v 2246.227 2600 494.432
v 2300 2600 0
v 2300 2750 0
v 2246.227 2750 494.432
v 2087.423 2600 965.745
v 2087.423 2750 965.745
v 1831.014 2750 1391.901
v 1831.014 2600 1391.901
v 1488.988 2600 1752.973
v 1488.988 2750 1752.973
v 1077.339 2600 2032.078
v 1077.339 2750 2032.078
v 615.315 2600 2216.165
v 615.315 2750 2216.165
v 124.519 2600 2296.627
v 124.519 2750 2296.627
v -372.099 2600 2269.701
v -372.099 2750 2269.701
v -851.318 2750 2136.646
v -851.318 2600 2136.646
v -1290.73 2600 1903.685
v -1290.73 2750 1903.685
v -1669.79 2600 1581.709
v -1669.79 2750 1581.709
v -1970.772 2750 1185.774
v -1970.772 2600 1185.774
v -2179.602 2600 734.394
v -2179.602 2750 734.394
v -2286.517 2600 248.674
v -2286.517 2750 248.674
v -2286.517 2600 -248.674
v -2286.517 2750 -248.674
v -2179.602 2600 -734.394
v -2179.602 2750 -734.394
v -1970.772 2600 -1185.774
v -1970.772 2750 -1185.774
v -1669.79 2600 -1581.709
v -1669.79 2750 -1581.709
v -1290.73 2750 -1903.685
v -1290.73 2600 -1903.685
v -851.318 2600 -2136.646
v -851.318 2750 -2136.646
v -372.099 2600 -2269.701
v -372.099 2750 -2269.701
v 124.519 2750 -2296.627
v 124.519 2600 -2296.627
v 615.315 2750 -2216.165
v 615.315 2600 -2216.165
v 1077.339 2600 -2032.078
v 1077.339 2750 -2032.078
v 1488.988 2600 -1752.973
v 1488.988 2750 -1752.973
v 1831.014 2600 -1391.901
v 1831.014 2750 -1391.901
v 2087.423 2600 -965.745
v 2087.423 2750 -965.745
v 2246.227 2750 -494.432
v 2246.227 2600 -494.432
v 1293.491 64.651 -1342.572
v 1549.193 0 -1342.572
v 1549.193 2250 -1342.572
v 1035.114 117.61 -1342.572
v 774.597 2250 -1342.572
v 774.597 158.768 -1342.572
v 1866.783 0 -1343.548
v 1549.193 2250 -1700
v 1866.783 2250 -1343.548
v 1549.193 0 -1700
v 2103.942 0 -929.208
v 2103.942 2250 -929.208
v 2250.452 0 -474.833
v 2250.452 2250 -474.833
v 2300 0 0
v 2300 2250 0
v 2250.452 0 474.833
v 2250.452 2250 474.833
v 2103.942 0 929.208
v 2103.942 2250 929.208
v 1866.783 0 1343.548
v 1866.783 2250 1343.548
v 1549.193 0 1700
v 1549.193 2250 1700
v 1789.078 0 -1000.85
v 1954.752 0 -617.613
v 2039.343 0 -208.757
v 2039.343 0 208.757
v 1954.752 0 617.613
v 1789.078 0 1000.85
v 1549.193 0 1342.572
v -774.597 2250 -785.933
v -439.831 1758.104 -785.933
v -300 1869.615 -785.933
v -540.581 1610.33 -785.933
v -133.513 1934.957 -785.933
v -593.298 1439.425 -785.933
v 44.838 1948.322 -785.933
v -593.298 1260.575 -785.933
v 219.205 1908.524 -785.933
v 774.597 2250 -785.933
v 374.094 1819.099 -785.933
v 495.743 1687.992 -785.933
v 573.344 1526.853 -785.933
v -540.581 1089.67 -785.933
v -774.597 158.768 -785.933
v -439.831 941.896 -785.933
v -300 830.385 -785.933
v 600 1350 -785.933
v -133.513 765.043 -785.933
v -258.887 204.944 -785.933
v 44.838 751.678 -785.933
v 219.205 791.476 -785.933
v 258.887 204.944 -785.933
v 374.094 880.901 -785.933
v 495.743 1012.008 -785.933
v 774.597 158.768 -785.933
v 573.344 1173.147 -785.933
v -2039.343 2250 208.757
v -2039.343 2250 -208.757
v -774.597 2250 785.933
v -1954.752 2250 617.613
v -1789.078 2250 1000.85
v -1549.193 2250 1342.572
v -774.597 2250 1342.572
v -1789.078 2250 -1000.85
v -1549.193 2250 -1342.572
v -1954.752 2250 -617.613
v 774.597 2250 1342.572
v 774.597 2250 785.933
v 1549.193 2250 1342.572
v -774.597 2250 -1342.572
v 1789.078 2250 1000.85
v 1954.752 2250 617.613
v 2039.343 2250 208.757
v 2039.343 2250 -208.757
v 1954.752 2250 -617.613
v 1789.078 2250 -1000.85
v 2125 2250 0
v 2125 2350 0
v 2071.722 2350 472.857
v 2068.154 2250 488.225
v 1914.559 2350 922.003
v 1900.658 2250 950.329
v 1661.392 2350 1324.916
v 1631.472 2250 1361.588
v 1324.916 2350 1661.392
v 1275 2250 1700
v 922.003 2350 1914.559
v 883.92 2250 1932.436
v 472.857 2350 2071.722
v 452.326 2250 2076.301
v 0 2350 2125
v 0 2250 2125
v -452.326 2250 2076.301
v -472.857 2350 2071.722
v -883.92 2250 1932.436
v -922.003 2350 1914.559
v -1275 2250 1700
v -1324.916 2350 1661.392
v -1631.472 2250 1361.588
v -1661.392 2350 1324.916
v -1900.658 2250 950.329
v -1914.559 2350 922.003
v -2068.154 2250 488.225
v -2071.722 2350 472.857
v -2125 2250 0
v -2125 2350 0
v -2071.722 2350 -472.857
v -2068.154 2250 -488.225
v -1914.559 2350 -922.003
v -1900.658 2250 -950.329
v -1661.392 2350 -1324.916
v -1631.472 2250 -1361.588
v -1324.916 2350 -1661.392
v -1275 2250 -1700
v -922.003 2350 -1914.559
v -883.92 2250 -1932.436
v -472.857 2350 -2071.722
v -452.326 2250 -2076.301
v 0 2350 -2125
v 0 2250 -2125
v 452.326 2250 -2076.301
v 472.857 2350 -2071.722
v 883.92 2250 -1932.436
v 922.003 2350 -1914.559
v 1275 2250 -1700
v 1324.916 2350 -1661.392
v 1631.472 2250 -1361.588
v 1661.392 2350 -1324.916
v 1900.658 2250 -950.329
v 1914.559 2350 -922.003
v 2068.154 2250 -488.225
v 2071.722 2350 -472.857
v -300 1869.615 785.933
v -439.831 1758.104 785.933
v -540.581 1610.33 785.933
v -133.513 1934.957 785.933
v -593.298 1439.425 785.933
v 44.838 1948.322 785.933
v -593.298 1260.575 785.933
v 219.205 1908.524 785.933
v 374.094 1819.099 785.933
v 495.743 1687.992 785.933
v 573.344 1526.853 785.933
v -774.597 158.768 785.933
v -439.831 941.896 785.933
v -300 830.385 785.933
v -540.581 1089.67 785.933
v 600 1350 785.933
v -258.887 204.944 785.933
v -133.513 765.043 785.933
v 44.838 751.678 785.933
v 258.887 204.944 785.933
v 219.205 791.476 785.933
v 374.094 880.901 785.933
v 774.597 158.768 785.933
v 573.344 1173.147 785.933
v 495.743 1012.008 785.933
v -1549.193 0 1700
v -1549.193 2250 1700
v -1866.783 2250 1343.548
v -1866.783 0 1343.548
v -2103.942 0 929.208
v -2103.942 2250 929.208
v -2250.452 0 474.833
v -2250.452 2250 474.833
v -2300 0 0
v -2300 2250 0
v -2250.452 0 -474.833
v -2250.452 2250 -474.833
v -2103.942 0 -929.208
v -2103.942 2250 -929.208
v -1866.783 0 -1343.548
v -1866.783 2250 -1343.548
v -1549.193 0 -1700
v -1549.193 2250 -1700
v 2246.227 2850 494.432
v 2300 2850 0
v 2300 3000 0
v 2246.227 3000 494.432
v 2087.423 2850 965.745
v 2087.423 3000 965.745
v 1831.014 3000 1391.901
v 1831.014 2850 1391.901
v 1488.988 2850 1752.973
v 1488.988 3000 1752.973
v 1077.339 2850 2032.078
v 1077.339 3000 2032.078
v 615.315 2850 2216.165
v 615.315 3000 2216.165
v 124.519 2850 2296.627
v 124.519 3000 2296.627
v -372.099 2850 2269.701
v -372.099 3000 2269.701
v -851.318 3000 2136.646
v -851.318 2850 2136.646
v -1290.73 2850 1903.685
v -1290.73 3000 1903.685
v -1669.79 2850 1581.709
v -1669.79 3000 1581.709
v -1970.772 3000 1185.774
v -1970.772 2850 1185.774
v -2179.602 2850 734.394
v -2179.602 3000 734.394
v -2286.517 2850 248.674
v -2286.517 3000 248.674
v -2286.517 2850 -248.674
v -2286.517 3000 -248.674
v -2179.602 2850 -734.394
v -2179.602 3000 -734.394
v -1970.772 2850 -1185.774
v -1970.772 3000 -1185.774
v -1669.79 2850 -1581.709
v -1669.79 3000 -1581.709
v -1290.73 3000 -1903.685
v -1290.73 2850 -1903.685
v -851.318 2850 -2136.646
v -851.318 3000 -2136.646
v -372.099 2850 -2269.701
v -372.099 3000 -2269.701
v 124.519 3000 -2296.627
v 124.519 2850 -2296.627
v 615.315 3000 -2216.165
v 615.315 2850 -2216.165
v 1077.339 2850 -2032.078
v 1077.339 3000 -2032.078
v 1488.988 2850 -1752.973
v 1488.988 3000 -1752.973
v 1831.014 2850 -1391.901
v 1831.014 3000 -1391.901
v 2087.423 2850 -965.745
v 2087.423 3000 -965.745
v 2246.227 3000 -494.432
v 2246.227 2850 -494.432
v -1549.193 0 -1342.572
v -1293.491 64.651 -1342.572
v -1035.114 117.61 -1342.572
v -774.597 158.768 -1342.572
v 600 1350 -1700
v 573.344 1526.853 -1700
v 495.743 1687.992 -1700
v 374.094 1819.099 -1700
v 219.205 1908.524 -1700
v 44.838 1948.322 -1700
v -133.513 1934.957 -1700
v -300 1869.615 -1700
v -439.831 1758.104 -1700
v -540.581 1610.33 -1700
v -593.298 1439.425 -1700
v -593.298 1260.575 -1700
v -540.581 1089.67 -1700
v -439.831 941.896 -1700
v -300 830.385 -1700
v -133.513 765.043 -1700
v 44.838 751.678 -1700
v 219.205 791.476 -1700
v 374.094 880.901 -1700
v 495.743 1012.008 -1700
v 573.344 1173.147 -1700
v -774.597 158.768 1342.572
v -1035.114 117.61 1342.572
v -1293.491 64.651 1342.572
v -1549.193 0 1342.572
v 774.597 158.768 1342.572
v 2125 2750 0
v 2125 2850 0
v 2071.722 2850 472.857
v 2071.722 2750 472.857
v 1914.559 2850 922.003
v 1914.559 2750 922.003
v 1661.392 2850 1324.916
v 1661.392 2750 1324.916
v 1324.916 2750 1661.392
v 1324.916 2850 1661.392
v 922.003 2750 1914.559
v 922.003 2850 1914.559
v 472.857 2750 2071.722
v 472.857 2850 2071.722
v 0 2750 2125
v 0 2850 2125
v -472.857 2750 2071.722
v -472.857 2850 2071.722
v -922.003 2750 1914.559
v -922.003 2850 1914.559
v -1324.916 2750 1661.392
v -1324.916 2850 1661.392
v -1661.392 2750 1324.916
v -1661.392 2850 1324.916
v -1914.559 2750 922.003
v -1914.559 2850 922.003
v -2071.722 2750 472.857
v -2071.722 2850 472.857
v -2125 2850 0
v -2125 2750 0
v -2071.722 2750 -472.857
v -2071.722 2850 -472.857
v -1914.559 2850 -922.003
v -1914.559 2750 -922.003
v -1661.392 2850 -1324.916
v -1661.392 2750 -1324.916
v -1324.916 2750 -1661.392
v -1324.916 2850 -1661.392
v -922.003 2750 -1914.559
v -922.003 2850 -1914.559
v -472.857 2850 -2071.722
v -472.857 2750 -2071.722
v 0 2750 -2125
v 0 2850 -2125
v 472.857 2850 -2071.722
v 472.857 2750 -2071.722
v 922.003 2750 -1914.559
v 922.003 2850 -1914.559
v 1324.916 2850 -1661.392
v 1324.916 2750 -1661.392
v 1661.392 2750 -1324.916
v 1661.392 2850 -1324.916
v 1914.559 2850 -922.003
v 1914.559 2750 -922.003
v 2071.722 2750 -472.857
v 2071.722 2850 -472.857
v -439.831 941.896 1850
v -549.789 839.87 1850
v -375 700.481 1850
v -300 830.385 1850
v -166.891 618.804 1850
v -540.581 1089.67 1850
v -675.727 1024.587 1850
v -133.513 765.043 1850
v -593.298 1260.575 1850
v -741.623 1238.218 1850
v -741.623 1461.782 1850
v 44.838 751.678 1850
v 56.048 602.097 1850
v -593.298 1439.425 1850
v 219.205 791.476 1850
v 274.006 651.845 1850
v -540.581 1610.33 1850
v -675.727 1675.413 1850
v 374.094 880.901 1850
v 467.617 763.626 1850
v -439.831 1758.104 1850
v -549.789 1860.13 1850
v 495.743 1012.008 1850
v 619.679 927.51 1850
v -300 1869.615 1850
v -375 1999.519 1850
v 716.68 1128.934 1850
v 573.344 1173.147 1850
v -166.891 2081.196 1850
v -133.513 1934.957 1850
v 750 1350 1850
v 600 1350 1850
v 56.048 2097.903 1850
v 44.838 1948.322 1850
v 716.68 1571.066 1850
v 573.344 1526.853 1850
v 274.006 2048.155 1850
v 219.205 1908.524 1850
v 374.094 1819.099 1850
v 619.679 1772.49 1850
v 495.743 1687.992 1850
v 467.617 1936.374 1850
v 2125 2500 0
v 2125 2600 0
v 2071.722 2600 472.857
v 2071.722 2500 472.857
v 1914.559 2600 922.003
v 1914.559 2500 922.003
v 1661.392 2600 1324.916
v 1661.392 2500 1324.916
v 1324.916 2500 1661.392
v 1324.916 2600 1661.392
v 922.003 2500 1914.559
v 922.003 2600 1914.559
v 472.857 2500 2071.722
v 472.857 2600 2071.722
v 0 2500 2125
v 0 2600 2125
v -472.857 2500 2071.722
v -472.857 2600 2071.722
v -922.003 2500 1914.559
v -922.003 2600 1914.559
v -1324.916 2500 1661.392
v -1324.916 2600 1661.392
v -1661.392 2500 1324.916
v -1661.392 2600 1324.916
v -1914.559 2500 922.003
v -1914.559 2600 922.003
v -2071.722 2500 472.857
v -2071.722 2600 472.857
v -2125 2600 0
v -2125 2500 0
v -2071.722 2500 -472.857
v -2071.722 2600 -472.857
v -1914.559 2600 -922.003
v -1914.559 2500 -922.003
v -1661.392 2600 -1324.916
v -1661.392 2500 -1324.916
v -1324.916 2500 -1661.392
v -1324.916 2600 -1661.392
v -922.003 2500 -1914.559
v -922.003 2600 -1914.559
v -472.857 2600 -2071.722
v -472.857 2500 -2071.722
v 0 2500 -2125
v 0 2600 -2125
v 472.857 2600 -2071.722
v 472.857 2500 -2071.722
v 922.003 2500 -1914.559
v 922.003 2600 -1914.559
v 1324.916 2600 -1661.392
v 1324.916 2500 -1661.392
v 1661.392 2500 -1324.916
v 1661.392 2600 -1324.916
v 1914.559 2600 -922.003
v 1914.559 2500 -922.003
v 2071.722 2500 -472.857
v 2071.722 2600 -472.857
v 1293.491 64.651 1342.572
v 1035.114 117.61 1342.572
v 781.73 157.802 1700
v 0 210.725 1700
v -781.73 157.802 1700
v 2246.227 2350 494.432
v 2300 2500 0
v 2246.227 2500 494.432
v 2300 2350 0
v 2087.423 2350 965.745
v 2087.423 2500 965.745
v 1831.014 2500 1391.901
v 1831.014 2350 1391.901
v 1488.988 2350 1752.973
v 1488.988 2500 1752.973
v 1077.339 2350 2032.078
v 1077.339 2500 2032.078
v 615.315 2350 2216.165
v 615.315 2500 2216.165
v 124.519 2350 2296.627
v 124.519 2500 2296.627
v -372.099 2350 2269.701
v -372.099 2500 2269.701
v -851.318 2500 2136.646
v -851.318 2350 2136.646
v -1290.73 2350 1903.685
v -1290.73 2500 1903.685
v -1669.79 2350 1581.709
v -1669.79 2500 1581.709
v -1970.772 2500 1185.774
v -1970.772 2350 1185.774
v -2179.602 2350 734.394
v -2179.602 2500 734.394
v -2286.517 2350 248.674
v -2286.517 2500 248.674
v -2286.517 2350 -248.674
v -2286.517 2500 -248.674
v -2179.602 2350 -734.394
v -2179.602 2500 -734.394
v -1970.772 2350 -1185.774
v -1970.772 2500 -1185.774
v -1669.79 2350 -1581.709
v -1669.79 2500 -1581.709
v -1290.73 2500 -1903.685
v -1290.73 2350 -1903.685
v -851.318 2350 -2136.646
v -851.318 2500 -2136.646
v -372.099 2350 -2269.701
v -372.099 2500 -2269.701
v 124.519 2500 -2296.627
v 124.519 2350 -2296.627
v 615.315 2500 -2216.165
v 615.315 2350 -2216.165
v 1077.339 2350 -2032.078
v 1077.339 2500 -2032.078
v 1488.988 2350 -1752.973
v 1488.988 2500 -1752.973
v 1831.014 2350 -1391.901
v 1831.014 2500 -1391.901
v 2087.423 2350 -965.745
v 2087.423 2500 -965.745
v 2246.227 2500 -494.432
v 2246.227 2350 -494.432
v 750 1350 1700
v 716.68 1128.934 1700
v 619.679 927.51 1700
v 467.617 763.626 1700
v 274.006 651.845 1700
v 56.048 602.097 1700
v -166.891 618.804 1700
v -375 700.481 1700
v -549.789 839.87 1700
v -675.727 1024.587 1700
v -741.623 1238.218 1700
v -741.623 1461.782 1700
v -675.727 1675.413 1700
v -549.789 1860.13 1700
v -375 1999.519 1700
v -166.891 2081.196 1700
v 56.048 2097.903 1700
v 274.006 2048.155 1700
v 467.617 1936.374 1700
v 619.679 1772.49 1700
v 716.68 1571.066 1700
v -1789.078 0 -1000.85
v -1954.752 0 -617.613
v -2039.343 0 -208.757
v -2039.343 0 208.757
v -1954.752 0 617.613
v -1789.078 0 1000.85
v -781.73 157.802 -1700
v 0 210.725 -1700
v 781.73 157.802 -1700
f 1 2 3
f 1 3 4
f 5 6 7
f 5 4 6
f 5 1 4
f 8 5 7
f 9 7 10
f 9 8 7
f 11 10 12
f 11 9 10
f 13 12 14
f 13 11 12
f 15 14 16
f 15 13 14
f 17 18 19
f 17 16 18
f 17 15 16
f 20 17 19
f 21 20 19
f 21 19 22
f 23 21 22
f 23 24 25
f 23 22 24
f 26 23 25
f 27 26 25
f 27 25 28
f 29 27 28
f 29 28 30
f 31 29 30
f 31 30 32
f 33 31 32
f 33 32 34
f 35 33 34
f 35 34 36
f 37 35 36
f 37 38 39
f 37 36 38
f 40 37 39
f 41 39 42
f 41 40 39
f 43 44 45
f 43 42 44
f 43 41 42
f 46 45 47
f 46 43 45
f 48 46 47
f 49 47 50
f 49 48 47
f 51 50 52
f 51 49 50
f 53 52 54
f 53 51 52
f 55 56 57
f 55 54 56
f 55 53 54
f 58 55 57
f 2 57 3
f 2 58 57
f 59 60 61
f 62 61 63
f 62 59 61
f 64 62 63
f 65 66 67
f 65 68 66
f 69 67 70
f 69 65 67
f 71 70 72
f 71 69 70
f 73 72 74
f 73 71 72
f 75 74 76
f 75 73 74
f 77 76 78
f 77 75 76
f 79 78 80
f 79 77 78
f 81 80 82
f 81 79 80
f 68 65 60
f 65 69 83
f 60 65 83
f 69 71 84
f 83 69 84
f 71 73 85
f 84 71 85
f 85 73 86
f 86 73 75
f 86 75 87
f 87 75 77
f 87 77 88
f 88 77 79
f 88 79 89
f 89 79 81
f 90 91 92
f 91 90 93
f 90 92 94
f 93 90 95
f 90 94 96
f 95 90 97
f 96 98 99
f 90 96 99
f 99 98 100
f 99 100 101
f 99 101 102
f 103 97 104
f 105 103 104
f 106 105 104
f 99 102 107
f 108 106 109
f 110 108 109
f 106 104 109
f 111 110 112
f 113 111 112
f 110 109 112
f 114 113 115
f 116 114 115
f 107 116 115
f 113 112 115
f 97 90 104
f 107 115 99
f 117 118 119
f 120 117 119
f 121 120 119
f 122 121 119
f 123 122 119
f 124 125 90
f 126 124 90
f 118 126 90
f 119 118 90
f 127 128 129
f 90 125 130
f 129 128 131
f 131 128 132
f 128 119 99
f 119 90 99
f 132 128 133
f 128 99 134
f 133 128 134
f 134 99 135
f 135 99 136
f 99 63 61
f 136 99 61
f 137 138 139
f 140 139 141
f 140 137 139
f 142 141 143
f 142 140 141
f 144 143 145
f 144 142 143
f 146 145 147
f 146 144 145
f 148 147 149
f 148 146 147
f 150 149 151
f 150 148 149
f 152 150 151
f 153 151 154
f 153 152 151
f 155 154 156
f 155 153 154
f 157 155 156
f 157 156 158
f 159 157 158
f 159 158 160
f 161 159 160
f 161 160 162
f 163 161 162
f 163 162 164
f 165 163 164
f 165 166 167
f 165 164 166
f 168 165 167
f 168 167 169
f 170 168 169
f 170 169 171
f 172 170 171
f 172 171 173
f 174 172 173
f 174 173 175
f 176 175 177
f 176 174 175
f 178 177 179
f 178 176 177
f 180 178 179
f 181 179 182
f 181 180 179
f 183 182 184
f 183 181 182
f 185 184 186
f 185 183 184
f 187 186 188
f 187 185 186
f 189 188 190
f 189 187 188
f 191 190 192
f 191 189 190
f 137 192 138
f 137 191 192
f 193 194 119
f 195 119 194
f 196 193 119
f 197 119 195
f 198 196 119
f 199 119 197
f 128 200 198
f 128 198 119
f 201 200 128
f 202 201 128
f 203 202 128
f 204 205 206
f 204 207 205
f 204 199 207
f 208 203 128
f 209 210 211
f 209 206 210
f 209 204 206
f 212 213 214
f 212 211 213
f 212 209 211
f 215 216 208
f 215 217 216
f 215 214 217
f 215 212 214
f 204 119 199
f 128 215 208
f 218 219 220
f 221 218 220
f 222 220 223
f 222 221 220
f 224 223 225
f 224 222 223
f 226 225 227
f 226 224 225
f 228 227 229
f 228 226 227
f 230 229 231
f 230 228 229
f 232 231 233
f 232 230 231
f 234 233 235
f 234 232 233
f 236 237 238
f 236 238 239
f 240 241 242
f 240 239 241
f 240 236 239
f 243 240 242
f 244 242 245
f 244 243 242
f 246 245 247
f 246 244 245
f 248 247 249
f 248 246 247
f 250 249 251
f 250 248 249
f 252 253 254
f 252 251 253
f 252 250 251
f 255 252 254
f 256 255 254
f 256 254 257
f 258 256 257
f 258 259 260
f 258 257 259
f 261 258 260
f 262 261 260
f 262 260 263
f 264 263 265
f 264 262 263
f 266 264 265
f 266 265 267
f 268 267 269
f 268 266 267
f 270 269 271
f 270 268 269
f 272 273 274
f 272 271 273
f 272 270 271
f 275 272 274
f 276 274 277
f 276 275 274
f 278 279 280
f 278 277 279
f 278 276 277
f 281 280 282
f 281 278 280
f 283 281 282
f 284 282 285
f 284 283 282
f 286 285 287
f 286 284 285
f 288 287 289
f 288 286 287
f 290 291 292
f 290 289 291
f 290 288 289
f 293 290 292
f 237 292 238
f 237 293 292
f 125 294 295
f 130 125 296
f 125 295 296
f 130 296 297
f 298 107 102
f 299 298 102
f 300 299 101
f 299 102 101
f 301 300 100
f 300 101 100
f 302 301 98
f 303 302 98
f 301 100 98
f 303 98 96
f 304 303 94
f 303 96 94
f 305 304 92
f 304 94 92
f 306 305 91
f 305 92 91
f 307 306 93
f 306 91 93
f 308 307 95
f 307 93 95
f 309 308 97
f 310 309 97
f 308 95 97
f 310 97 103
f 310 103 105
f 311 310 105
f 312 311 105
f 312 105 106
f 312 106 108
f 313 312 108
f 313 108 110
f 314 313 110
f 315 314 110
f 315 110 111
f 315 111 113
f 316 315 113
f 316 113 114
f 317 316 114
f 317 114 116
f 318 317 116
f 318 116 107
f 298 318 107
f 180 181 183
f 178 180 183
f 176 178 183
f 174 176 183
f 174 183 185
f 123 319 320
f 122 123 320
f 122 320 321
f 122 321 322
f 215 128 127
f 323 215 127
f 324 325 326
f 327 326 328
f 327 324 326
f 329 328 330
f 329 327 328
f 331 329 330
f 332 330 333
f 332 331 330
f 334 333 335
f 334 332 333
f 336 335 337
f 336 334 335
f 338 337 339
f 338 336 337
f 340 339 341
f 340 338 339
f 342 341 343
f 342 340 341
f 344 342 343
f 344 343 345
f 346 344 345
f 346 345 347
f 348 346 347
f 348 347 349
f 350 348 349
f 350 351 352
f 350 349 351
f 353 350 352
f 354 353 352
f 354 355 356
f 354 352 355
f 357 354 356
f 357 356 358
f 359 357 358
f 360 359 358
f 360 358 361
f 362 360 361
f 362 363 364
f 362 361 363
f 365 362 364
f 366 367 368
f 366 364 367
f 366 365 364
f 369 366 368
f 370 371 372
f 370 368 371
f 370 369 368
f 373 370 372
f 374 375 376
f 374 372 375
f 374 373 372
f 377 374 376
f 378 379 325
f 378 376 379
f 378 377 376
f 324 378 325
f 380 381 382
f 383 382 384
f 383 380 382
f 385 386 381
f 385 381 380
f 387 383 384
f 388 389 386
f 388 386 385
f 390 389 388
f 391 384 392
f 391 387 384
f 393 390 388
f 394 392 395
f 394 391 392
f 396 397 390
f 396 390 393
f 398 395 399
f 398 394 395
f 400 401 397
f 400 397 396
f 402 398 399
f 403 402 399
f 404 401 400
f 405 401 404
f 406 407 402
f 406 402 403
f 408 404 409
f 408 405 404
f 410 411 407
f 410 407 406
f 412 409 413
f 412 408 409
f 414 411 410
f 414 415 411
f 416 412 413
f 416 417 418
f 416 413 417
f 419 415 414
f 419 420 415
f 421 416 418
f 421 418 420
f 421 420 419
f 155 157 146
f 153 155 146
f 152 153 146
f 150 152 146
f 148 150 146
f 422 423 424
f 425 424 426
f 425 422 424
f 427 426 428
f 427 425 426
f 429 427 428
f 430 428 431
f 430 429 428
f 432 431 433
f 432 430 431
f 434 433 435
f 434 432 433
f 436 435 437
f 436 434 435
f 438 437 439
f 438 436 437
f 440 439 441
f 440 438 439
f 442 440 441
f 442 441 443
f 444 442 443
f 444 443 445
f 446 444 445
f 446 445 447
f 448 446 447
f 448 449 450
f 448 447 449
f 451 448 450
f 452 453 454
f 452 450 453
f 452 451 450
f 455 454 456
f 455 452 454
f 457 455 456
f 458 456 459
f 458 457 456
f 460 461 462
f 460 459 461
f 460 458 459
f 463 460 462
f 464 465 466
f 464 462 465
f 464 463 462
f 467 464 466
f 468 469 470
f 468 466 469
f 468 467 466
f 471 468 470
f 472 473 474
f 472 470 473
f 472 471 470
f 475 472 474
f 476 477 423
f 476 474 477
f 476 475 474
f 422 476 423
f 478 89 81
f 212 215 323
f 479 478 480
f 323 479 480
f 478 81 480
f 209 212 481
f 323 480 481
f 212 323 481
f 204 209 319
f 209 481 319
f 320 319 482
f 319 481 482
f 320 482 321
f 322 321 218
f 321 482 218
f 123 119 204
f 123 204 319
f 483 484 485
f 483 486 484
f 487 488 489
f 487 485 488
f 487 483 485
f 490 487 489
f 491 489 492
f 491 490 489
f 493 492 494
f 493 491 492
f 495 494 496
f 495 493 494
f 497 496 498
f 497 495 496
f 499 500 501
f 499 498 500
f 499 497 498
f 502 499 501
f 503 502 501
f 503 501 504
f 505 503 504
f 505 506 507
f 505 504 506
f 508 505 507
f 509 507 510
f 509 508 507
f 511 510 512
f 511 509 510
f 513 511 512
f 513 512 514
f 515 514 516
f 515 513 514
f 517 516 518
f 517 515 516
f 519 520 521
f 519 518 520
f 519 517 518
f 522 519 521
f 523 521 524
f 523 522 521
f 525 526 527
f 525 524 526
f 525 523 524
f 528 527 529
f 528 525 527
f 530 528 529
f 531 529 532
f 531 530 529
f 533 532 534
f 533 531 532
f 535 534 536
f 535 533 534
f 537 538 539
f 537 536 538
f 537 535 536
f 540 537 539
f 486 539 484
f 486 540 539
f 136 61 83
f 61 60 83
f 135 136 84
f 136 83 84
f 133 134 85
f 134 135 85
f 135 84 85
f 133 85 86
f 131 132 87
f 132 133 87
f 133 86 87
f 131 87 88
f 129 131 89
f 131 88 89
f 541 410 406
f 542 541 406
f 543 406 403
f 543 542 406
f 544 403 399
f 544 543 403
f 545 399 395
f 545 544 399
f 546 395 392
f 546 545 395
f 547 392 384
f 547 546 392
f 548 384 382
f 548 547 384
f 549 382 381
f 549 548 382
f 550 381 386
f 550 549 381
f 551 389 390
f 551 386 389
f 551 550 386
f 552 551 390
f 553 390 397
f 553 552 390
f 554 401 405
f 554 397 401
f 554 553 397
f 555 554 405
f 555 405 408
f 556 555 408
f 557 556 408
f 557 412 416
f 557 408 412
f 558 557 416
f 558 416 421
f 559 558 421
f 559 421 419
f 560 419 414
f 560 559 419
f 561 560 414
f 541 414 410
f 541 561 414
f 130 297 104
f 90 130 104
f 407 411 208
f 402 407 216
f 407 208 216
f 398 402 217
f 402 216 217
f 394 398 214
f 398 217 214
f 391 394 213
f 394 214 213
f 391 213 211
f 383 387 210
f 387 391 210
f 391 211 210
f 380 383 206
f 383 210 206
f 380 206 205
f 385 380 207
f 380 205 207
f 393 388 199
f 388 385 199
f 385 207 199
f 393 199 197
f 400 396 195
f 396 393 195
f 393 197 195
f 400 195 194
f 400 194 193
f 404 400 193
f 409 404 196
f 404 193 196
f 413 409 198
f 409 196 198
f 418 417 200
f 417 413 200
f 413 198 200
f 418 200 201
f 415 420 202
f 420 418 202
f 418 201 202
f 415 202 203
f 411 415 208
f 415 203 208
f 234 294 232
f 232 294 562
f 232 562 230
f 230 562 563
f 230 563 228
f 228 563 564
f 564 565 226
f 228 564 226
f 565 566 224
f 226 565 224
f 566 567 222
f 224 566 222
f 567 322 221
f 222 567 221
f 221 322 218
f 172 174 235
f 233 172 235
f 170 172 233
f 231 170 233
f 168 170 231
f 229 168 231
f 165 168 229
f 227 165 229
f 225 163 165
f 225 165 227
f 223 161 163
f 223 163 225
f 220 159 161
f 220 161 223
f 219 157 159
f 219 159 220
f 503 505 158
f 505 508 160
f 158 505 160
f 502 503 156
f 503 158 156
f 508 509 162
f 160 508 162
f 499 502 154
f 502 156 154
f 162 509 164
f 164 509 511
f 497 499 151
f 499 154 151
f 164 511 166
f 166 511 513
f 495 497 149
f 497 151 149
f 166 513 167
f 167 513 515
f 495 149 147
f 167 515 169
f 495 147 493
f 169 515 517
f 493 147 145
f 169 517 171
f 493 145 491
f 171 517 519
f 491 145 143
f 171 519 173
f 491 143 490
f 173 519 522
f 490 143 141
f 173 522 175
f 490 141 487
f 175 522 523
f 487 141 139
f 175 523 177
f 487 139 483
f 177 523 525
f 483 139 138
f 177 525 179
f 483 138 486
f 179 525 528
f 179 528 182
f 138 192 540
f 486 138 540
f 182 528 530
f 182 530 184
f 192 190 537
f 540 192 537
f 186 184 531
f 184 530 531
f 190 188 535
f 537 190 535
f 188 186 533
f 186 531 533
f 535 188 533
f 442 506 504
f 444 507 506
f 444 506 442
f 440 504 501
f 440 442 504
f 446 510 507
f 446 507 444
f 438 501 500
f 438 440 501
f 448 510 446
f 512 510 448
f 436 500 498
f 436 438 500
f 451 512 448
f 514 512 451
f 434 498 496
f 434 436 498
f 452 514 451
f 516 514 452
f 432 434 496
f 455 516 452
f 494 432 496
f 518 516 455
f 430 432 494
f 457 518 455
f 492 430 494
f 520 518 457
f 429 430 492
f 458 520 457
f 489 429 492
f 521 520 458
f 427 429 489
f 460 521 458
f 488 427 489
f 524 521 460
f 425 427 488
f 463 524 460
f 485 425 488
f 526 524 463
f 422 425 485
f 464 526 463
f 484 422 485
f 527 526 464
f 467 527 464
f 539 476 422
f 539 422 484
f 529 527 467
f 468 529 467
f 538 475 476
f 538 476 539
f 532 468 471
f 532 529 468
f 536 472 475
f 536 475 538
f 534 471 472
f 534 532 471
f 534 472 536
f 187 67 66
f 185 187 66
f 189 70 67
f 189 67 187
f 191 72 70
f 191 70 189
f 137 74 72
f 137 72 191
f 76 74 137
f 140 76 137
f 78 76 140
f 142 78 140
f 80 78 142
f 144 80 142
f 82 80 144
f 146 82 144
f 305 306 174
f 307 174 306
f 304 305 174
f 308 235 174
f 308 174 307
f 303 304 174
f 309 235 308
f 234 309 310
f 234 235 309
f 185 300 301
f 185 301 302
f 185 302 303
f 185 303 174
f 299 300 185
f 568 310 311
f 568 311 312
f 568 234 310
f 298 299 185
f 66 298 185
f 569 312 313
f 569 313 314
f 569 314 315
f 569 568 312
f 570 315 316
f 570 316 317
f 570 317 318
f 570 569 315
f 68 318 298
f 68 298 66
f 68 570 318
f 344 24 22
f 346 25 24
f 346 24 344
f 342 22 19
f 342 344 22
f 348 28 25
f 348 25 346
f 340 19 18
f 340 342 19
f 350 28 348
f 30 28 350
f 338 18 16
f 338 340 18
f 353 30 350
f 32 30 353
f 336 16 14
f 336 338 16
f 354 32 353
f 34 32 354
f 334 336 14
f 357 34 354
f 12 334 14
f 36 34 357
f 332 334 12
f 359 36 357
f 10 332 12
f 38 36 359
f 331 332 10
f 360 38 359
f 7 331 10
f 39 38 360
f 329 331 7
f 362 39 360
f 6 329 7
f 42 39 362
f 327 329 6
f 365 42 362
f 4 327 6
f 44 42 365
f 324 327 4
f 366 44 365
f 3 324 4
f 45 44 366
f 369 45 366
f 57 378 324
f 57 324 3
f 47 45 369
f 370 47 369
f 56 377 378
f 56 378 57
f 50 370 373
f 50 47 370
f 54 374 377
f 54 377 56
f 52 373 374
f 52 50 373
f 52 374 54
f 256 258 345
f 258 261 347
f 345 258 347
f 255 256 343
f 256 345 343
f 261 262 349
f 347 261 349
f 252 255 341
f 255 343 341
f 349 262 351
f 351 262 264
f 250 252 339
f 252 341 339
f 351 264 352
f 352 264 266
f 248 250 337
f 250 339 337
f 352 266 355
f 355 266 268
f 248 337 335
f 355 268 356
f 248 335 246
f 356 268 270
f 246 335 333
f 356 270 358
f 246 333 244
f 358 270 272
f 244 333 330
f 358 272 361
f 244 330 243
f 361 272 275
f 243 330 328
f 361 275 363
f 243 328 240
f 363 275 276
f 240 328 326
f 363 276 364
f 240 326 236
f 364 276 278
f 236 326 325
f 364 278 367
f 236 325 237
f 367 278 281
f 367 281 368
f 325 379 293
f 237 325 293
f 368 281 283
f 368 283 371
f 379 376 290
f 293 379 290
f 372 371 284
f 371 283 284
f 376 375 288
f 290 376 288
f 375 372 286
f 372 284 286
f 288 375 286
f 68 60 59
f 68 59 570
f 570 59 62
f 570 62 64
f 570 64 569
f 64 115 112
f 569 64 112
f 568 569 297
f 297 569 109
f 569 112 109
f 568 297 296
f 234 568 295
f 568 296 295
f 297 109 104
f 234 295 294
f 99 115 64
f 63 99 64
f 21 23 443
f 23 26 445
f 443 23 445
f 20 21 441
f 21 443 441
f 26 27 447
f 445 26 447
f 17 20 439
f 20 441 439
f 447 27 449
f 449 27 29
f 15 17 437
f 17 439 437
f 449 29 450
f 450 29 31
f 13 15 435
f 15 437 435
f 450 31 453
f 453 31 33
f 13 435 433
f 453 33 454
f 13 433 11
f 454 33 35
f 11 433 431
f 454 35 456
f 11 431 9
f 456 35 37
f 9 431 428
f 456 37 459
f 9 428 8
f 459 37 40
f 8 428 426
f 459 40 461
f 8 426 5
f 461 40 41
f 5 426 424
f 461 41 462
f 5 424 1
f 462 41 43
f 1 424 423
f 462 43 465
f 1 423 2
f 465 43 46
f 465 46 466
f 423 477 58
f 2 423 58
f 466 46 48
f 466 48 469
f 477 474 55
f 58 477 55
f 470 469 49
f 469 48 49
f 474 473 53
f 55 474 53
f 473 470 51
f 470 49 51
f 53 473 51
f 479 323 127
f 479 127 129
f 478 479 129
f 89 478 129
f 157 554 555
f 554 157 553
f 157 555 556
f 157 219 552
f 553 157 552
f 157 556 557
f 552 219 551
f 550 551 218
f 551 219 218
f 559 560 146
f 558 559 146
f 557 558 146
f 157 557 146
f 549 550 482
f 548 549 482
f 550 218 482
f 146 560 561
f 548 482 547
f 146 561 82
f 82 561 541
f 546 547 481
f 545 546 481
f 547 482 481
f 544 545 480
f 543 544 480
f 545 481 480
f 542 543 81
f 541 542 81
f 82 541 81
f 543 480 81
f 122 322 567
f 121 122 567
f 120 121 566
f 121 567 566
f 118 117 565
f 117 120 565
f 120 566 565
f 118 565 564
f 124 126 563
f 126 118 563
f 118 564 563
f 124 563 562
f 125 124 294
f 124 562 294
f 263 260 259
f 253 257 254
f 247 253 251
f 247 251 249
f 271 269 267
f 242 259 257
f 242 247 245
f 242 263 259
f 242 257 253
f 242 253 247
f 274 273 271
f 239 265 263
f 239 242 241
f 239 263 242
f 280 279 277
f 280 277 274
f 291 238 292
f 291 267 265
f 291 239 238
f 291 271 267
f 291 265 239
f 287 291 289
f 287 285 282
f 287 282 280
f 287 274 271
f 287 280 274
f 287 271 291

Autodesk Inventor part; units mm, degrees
ref_plane "YZ Plane" through (0, 0, 0) normal (1, 0, 0) x (0, 1, 0)
ref_plane "XZ Plane" through (0, 0, 0) normal (0, 1, 0) x (-1, 0, 0)
ref_plane "XY Plane" through (0, 0, 0) normal (0, 0, 1) x (1, 0, 0)
sketch "Sketch1" plane through (0, 0, 0) normal (0, 1, 0) x (-1, 0, 0)
  line L0 (0, -1700) -> (1549.1933, -1700)
  line L1 (1549.1933, -1700) -> (-1549.1933, -1700)
  line L2 (0, 1700) -> (1549.1933, 1700)
  line L3 (0, 1700) -> (-1549.1933, 1700)
  arc A0 (-1549.1933, 1700) -> (-1549.1933, -1700) centre (0, 0) ccw
  arc A1 (1549.1933, -1700) -> (1549.1933, 1700) centre (0, 0) ccw
  line L4 (0, 785.9327) -> (774.5967, 785.9327)
  line L5 (774.5967, 785.9327) -> (774.5967, 1342.5722)
  line L6 (774.5967, 1342.5722) -> (1549.1933, 1342.5722)
  line L7 (0, 785.9327) -> (-774.597, 785.9327)
  line L8 (-774.597, 785.9327) -> (-774.597, 1342.5722)
  line L9 (-774.597, 1342.5722) -> (-1549.1933, 1342.5722)
  line L10 (-1549.1933, -1342.5722) -> (-774.597, -1342.5722)
  line L11 (1549.1933, -1342.5722) -> (774.5967, -1342.5722)
  line L12 (774.5967, -1342.5722) -> (774.5967, -785.9332)
  line L13 (774.5967, -785.9332) -> (-774.597, -785.9332)
  line L14 (-774.597, -785.9332) -> (-774.597, -1342.5722)
  arc A2 (-1549.1933, 1342.5722) -> (-1549.1933, -1342.5722) centre (0, 0) ccw
  arc A3 (1549.1933, -1342.5722) -> (1549.1933, 1342.5722) centre (0, 0) ccw
extrude "Extrusion1" add sketch "Sketch1" along normal blind 2250
sketch "Sketch2" plane through (0, 2250, 0) normal (0, 1, 0) x (1, 0, 0)
  circle A0 centre (0, 0) radius 2125
  dimension "d8" = 4250
extrude "Extrusion2" add sketch "Sketch2" along normal blind 100
sketch "Sketch3" plane through (0, 2350, 0) normal (0, 1, 0) x (1, 0, 0)
  circle A0 centre (0, 0) radius 2300
  dimension "d11" = 4600
extrude "Extrusion3" add sketch "Sketch3" along normal blind 150
sketch "Sketch4" plane through (0, 2500, 0) normal (0, 1, 0) x (1, 0, 0)
  circle A0 centre (0, 0) radius 2125
  dimension "d14" = 4250
extrude "Extrusion4" add sketch "Sketch4" along normal blind 100
sketch "Sketch5" plane through (0, 2600, 0) normal (0, 1, 0) x (1, 0, 0)
  circle A0 centre (0, 0) radius 2300
  dimension "d17" = 4600
extrude "Extrusion5" add sketch "Sketch5" along normal blind 150
sketch "Sketch6" plane through (0, 2750, 0) normal (0, 1, 0) x (1, 0, 0)
  circle A0 centre (0, 0) radius 2125
  dimension "d20" = 4250
extrude "Extrusion6" add sketch "Sketch6" along normal blind 100
sketch "Sketch7" plane through (0, 2850, 0) normal (0, 1, 0) x (1, 0, 0)
  circle A0 centre (0, 0) radius 2300
  dimension "d23" = 4600
extrude "Extrusion7" add sketch "Sketch7" along normal blind 150
sketch "Sketch8" plane through (-1549.1933, 0, 1700) normal (0, 0, 1) x (1, 0, 0)
  line L0 (3098.3867, 0) -> (0, 0) projected
  arc A0 (3098.3867, 0) -> (0, 0) centre (1549.1933, -5589.2754) ccw
  line L1 (0, 0) -> (3098.3867, 0)
  point P0 (1549.1933, 0)
  dimension "d26" = 5800
extrude "Extrusion8" cut sketch "Sketch8" against normal blind 10000
sketch "Sketch9" plane through (-1275, 2250, 1700) normal (0, 0, 1) x (1, 0, 0)
  line L0 (1275, -2250) -> (1275, -900)
  circle A0 centre (1275, -900) radius 600
  dimension "d29" = 1350
  dimension "d30" = 1200
extrude "Extrusion9" cut sketch "Sketch9" against normal blind 10000
sketch "Sketch10" plane through (-1275, 2250, 1700) normal (0, 0, 1) x (1, 0, 0)
  circle A0 centre (1275, -900) radius 600 projected
  circle A1 centre (1275, -900) radius 600
  circle A2 centre (1275, -900) radius 750
  point P0 (1275, -2250)
  dimension "d33" = 1200
  dimension "d34" = 1500
extrude "Extrusion10" add sketch "Sketch10" along normal blind 150
